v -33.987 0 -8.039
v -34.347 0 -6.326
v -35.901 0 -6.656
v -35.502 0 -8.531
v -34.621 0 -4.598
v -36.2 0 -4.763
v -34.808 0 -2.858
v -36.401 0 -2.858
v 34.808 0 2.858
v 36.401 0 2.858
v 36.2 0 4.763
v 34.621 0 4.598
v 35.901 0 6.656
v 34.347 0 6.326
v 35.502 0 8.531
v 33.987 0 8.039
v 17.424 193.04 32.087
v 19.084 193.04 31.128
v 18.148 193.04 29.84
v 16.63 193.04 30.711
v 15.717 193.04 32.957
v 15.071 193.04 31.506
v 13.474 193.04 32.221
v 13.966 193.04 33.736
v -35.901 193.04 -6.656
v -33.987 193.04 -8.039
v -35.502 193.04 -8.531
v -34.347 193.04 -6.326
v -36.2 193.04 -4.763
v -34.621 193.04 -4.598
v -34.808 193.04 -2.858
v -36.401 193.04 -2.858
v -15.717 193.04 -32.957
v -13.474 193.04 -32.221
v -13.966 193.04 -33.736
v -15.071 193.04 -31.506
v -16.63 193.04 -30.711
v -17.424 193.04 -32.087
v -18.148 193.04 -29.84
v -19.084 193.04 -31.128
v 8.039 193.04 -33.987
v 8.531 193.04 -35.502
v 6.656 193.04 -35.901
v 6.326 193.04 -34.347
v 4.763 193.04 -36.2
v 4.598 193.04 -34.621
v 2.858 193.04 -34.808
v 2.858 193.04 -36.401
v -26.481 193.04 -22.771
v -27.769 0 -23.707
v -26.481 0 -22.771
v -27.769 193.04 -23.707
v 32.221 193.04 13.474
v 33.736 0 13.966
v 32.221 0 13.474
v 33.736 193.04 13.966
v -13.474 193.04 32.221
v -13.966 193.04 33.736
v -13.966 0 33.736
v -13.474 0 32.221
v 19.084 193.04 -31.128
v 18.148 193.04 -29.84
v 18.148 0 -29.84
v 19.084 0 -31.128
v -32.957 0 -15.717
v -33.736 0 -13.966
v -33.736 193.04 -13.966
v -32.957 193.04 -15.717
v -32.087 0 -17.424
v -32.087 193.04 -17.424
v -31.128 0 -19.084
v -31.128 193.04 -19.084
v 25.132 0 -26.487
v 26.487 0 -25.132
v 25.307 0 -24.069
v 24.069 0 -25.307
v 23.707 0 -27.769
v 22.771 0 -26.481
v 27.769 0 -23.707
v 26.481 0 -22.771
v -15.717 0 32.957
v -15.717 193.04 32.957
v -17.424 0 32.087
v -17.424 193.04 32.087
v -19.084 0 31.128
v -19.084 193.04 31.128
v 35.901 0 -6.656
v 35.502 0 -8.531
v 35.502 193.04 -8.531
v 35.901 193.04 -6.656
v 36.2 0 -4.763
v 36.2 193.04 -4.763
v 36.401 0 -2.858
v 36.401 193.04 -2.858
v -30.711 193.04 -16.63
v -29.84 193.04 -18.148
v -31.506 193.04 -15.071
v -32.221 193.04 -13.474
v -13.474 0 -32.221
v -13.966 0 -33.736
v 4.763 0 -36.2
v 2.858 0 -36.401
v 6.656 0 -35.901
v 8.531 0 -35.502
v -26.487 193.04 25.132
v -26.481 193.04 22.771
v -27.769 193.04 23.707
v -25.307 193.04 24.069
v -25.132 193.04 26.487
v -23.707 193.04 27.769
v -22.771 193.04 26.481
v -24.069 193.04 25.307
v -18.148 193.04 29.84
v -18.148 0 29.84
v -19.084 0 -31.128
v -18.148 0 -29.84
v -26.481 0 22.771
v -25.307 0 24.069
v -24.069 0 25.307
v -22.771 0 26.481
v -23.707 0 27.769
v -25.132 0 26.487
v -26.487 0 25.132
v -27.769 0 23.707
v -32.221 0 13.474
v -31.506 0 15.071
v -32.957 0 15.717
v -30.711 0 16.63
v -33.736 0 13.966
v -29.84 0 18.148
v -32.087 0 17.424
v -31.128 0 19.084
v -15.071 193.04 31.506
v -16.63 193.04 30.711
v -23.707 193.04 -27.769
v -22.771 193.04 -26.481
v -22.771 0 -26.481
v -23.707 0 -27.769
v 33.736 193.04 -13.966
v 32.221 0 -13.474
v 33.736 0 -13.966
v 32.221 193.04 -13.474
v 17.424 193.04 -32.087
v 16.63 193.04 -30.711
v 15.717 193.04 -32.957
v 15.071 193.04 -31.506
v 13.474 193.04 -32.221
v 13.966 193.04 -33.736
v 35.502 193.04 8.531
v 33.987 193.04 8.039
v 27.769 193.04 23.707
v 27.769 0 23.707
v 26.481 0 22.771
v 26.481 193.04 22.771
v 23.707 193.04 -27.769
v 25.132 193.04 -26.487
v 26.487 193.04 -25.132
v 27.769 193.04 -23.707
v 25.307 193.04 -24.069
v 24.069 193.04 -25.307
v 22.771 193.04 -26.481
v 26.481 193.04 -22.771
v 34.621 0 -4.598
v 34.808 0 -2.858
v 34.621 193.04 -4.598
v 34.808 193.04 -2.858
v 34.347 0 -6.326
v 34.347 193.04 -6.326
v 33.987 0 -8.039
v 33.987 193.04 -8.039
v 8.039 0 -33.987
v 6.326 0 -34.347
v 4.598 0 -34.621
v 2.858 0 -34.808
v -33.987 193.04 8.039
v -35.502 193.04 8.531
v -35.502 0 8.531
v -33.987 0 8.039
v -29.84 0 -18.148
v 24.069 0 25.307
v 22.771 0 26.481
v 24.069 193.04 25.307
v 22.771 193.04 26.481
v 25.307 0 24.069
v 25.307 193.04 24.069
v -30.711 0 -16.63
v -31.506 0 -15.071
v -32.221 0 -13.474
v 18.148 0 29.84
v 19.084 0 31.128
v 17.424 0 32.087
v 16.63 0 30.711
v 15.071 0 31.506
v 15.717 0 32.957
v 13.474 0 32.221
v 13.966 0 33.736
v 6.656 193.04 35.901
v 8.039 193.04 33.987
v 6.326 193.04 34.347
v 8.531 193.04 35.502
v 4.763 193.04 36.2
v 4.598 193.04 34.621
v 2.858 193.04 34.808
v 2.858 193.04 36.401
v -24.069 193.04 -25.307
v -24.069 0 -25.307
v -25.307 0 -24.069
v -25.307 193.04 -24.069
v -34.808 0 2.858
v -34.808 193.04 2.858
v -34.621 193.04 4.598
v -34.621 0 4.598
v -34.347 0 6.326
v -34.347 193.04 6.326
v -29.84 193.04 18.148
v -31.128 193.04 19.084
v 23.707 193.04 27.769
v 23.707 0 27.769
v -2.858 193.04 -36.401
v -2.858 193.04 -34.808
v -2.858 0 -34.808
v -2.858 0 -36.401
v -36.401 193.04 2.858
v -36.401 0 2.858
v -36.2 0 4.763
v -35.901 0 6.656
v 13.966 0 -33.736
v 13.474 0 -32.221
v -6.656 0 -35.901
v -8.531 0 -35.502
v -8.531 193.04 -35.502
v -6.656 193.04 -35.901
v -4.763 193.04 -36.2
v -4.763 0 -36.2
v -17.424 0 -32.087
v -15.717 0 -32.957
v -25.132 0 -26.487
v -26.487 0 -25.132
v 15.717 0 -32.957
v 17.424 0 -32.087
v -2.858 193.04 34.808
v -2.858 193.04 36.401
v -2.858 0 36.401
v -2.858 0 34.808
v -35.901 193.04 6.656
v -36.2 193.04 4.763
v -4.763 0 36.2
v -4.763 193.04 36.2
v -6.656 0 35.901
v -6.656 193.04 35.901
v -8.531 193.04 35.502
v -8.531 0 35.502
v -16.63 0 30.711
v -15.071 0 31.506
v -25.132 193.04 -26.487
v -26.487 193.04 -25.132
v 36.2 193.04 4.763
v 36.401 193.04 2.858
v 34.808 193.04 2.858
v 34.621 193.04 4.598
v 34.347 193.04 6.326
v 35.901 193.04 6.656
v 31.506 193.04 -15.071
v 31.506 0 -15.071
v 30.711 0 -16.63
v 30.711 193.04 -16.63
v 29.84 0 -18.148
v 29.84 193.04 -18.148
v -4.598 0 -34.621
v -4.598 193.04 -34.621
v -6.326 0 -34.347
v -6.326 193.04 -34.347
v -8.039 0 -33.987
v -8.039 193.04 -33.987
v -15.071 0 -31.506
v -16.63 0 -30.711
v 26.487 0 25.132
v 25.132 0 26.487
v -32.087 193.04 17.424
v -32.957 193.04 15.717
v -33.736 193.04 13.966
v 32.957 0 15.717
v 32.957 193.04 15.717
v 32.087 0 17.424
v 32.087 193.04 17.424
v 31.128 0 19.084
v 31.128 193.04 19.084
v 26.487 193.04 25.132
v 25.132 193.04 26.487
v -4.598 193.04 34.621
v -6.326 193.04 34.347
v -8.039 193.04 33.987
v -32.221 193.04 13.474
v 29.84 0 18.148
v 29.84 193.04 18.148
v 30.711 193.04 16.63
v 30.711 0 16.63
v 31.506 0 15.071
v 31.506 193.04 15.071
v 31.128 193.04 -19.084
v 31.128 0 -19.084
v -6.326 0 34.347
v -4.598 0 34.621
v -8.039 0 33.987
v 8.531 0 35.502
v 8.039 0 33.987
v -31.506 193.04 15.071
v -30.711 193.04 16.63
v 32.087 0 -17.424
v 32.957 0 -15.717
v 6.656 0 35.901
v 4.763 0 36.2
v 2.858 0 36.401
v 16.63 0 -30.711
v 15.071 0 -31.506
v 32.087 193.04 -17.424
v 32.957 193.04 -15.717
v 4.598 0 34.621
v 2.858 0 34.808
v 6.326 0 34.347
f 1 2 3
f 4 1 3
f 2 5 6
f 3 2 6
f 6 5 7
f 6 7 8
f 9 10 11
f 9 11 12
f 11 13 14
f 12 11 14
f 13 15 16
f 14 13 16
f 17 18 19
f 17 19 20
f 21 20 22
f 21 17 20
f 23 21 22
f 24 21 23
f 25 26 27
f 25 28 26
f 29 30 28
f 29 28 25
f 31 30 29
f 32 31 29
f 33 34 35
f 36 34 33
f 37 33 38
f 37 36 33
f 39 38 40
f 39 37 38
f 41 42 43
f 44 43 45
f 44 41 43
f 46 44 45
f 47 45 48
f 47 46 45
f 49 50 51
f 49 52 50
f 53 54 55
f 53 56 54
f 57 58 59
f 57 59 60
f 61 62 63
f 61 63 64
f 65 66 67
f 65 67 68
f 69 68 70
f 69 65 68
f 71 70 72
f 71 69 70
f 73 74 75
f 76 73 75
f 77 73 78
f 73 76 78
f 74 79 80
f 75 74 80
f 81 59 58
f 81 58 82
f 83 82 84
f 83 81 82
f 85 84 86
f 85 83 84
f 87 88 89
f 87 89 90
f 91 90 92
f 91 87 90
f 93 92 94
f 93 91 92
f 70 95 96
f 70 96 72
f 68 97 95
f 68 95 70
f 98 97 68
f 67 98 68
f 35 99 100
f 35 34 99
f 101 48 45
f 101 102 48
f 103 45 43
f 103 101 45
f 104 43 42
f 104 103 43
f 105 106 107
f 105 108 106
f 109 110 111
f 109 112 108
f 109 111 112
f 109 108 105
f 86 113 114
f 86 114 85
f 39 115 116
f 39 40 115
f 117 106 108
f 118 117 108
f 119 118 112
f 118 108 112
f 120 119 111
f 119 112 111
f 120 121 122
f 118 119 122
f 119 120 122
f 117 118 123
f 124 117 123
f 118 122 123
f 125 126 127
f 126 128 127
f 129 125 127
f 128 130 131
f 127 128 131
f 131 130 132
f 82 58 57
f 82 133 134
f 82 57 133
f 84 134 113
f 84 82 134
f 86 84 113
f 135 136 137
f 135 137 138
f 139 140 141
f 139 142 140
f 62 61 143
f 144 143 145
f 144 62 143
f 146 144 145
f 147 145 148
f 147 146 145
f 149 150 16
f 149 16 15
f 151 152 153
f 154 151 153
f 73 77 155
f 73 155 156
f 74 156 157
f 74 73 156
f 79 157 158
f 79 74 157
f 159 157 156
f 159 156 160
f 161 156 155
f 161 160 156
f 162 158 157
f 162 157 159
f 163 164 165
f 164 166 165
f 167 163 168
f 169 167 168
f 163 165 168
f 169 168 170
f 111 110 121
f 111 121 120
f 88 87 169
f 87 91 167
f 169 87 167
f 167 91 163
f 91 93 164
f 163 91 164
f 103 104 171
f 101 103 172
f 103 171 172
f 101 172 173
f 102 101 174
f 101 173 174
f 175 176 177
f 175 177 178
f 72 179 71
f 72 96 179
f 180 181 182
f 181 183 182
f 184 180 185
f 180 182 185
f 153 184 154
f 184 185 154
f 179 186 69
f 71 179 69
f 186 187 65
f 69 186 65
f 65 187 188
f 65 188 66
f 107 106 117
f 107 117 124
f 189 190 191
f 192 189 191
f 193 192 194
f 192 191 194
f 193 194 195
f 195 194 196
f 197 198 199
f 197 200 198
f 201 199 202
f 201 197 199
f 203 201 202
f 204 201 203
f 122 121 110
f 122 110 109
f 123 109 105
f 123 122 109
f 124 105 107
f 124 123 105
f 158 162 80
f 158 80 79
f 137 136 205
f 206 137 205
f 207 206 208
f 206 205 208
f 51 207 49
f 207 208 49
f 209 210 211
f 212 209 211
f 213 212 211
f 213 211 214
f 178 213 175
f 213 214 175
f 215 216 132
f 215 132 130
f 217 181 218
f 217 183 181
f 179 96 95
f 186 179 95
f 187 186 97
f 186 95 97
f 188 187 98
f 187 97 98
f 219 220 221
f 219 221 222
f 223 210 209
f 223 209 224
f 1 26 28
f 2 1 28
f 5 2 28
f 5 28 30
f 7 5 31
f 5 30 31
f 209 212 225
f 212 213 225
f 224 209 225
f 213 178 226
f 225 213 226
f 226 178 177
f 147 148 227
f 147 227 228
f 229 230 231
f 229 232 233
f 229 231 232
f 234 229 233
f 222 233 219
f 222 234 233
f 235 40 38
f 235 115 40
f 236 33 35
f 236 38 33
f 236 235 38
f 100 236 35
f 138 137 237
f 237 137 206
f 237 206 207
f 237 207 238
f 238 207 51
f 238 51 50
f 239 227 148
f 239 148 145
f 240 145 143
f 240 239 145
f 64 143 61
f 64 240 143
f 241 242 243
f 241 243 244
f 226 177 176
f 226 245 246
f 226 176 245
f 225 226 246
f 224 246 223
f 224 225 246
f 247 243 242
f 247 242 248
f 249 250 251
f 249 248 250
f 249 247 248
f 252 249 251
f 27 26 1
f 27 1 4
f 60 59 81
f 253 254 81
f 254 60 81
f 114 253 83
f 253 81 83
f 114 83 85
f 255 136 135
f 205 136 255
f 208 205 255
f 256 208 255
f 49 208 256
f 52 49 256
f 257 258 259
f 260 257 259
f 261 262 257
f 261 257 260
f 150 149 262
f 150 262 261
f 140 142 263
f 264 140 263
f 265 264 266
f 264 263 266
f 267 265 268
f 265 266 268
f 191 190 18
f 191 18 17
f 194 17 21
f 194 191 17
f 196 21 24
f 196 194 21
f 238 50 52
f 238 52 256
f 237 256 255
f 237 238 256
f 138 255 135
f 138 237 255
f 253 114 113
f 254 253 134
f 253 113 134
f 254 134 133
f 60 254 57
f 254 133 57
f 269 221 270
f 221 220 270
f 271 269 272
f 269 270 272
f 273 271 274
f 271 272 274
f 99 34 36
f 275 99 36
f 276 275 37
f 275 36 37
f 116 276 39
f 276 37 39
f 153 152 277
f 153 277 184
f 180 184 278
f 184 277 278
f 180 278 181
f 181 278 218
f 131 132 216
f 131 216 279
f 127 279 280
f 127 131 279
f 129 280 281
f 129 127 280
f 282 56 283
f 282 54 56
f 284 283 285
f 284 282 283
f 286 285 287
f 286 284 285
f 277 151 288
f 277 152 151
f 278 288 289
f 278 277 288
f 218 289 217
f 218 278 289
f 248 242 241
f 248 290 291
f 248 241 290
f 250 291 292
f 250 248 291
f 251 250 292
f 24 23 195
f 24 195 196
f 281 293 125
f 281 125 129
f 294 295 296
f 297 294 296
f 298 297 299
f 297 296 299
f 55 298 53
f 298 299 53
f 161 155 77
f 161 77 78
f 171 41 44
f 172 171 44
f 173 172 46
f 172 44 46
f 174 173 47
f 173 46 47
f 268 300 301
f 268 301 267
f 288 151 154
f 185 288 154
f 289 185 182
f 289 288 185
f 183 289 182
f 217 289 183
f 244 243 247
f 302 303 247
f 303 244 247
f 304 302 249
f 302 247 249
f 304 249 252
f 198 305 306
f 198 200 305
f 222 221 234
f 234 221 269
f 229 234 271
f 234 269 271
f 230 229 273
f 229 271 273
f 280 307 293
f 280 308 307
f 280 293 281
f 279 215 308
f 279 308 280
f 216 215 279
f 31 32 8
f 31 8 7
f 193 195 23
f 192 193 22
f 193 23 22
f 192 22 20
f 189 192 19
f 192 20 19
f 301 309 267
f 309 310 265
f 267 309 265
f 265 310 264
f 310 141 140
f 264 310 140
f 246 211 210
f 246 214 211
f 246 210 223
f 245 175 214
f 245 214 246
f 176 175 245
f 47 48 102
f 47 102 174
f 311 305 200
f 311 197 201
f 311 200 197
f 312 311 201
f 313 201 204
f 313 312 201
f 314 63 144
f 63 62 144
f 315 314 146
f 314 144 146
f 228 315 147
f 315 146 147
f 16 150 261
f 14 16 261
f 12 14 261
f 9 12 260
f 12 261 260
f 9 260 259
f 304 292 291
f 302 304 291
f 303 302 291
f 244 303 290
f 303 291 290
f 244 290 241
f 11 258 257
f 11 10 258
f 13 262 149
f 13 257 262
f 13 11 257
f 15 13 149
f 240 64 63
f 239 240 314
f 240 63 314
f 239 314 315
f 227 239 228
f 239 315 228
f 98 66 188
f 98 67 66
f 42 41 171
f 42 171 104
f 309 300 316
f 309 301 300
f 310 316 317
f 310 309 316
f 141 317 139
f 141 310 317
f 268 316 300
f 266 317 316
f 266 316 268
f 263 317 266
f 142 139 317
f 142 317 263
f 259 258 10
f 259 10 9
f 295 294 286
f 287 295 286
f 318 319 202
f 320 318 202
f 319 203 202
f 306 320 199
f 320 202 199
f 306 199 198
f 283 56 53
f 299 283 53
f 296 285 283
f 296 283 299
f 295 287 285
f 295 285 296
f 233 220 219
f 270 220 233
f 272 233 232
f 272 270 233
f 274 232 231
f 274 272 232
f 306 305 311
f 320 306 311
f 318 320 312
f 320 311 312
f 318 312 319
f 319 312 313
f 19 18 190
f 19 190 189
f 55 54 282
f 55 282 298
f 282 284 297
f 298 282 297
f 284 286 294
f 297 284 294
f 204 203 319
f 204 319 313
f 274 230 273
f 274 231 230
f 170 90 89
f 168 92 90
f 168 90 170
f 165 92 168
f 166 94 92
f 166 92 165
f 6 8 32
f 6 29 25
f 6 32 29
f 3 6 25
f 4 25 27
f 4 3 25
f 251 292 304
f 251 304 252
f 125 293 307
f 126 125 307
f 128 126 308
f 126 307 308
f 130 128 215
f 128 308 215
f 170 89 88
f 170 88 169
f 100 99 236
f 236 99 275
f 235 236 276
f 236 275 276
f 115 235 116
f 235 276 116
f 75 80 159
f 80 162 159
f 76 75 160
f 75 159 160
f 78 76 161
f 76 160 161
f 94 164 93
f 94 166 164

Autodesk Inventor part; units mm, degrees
ref_plane "YZ Plane" through (0, 0, 0) normal (1, 0, 0) x (0, 1, 0)
ref_plane "XZ Plane" through (0, 0, 0) normal (0, 1, 0) x (-1, 0, 0)
ref_plane "XY Plane" through (0, 0, 0) normal (0, 0, 1) x (1, 0, 0)
sketch "Sketch1" plane through (0, 0, 0) normal (0, 1, 0) x (-1, 0, 0)
  circle A0 centre (0, 0) radius 36.5125
  dimension "d0" = 73.025
extrude "Extrusion1" add sketch "Sketch1" along normal blind 193.04
sketch "Sketch2" plane through (0, 193.04, 0) normal (0, 1, 0) x (1, 0, 0)
  circle A0 centre (0, 0) radius 34.925
  dimension "d3" = 69.85
extrude "Extrusion2" cut sketch "Sketch2" against normal through all
sketch "Sketch3" plane through (0, 193.04, 0) normal (0, 1, 0) x (1, 0, 0)
  line L0 (-31.75, -2.8575) -> (-37.465, -2.8575)
  line L1 (-37.465, -2.8575) -> (-37.465, 2.8575)
  line L2 (-37.465, 2.8575) -> (-31.75, 2.8575)
  line L3 (-31.75, 2.8575) -> (-31.75, -2.8575)
  circle A0 centre (0, 0) radius 36.5125 projected
  line L4 (-29.313, -12.5289) -> (-34.7483, -14.295)
  line L5 (-34.7483, -14.295) -> (-36.5143, -8.8597)
  line L6 (-36.5143, -8.8597) -> (-31.0791, -7.0936)
  line L7 (-31.0791, -7.0936) -> (-29.313, -12.5289)
  line L8 (-24.0067, -20.9739) -> (-28.6302, -24.3331)
  line L9 (-28.6302, -24.3331) -> (-31.9894, -19.7096)
  line L10 (-31.9894, -19.7096) -> (-27.3659, -16.3504)
  line L11 (-27.3659, -16.3504) -> (-24.0067, -20.9739)
  line L12 (-16.3504, -27.3659) -> (-19.7096, -31.9894)
  line L13 (-19.7096, -31.9894) -> (-24.3331, -28.6302)
  line L14 (-24.3331, -28.6302) -> (-20.9739, -24.0067)
  line L15 (-20.9739, -24.0067) -> (-16.3504, -27.3659)
  line L16 (-7.0936, -31.0791) -> (-8.8597, -36.5143)
  line L17 (-8.8597, -36.5143) -> (-14.295, -34.7483)
  line L18 (-14.295, -34.7483) -> (-12.5289, -29.313)
  line L19 (-12.5289, -29.313) -> (-7.0936, -31.0791)
  line L20 (2.8575, -31.75) -> (2.8575, -37.465)
  line L21 (2.8575, -37.465) -> (-2.8575, -37.465)
  line L22 (-2.8575, -37.465) -> (-2.8575, -31.75)
  line L23 (-2.8575, -31.75) -> (2.8575, -31.75)
  line L24 (12.5289, -29.313) -> (14.295, -34.7483)
  line L25 (14.295, -34.7483) -> (8.8597, -36.5143)
  line L26 (8.8597, -36.5143) -> (7.0936, -31.0791)
  line L27 (7.0936, -31.0791) -> (12.5289, -29.313)
  line L28 (20.9739, -24.0067) -> (24.3331, -28.6302)
  line L29 (24.3331, -28.6302) -> (19.7096, -31.9894)
  line L30 (19.7096, -31.9894) -> (16.3504, -27.3659)
  line L31 (16.3504, -27.3659) -> (20.9739, -24.0067)
  line L32 (27.3659, -16.3504) -> (31.9894, -19.7096)
  line L33 (31.9894, -19.7096) -> (28.6302, -24.3331)
  line L34 (28.6302, -24.3331) -> (24.0067, -20.9739)
  line L35 (24.0067, -20.9739) -> (27.3659, -16.3504)
  line L36 (31.0791, -7.0936) -> (36.5143, -8.8597)
  line L37 (36.5143, -8.8597) -> (34.7483, -14.295)
  line L38 (34.7483, -14.295) -> (29.313, -12.5289)
  line L39 (29.313, -12.5289) -> (31.0791, -7.0936)
  line L40 (31.75, 2.8575) -> (37.465, 2.8575)
  line L41 (37.465, 2.8575) -> (37.465, -2.8575)
  line L42 (37.465, -2.8575) -> (31.75, -2.8575)
  line L43 (31.75, -2.8575) -> (31.75, 2.8575)
  line L44 (29.313, 12.5289) -> (34.7483, 14.295)
  line L45 (34.7483, 14.295) -> (36.5143, 8.8597)
  line L46 (36.5143, 8.8597) -> (31.0791, 7.0936)
  line L47 (31.0791, 7.0936) -> (29.313, 12.5289)
  line L48 (24.0067, 20.9739) -> (28.6302, 24.3331)
  line L49 (28.6302, 24.3331) -> (31.9894, 19.7096)
  line L50 (31.9894, 19.7096) -> (27.3659, 16.3504)
  line L51 (27.3659, 16.3504) -> (24.0067, 20.9739)
  line L52 (16.3504, 27.3659) -> (19.7096, 31.9894)
  line L53 (19.7096, 31.9894) -> (24.3331, 28.6302)
  line L54 (24.3331, 28.6302) -> (20.9739, 24.0067)
  line L55 (20.9739, 24.0067) -> (16.3504, 27.3659)
  line L56 (7.0936, 31.0791) -> (8.8597, 36.5143)
  line L57 (8.8597, 36.5143) -> (14.295, 34.7483)
  line L58 (14.295, 34.7483) -> (12.5289, 29.313)
  line L59 (12.5289, 29.313) -> (7.0936, 31.0791)
  line L60 (-2.8575, 31.75) -> (-2.8575, 37.465)
  line L61 (-2.8575, 37.465) -> (2.8575, 37.465)
  line L62 (2.8575, 37.465) -> (2.8575, 31.75)
  line L63 (2.8575, 31.75) -> (-2.8575, 31.75)
  line L64 (-12.5289, 29.313) -> (-14.295, 34.7483)
  line L65 (-14.295, 34.7483) -> (-8.8597, 36.5143)
  line L66 (-8.8597, 36.5143) -> (-7.0936, 31.0791)
  line L67 (-7.0936, 31.0791) -> (-12.5289, 29.313)
  line L68 (-20.9739, 24.0067) -> (-24.3331, 28.6302)
  line L69 (-24.3331, 28.6302) -> (-19.7096, 31.9894)
  line L70 (-19.7096, 31.9894) -> (-16.3504, 27.3659)
  line L71 (-16.3504, 27.3659) -> (-20.9739, 24.0067)
  line L72 (-27.3659, 16.3504) -> (-31.9894, 19.7096)
  line L73 (-31.9894, 19.7096) -> (-28.6302, 24.3331)
  line L74 (-28.6302, 24.3331) -> (-24.0067, 20.9739)
  line L75 (-24.0067, 20.9739) -> (-27.3659, 16.3504)
  line L76 (-31.0791, 7.0936) -> (-36.5143, 8.8597)
  line L77 (-36.5143, 8.8597) -> (-34.7483, 14.295)
  line L78 (-34.7483, 14.295) -> (-29.313, 12.5289)
  line L79 (-29.313, 12.5289) -> (-31.0791, 7.0936)
  circle A1 centre (0, 0) radius 34.925 projected
  point P0 (-36.5125, 0)
  point P1 (-34.7255, -11.283)
  point P2 (-29.5392, -21.4615)
  point P3 (-21.4615, -29.5392)
  point P4 (-11.283, -34.7255)
  point P5 (0, -36.5125)
  point P6 (11.283, -34.7255)
  point P7 (21.4615, -29.5392)
  point P8 (29.5392, -21.4615)
  point P9 (34.7255, -11.283)
  point P10 (36.5125, 0)
  point P11 (34.7255, 11.283)
  point P12 (29.5392, 21.4615)
  point P13 (21.4615, 29.5392)
  point P14 (11.283, 34.7255)
  point P15 (0, 36.5125)
  point P16 (-11.283, 34.7255)
  point P17 (-21.4615, 29.5392)
  point P18 (-29.5392, 21.4615)
  point P19 (-34.7255, 11.283)
  dimension "d6" = 5.715
  dimension "d7" = 5.715
  dimension "d8" = 2.8575
  dimension "d13" = 360
  dimension "d15" = 2.54
extrude "Extrusion3" cut sketch "Sketch3" against normal through all contours L0 A1 L2 L3 | L0 A0 L2 A1 | L0 L1 L2 A0 | A1 L4 A0 L6 | L6 L7 L4 A1 | A0 L4 L5 L6 | A1 L78 L79 L76 | L76 A0 L78 A1 | L76 L77 L78 A0 | A1 L8 A0 L10 | L10 L11 L8 A1 | A0 L8 L9 L10 | A1 L74 L75 L72 | L72 A0 L74 A1 | L72 L73 L74 A0 | A1 L12 A0 L14 | L14 L15 L12 A1 | A0 L12 L13 L14 | A1 L70 L71 L68 | L68 A0 L70 A1 | L68 L69 L70 A0 | A1 L16 A0 L18 | L18 L19 L16 A1 | A0 L16 L17 L18 | A1 L66 L67 L64 | L64 A0 L66 A1 | L64 L65 L66 A0 | A1 L20 A0 L22 | L22 L23 L20 A1 | A0 L20 L21 L22 | A1 L62 L63 L60 | L60 A0 L62 A1 | L60 L61 L62 A0 | A1 L24 A0 L26 | L26 L27 L24 A1 | A0 L24 L25 L26 | A1 L58 L59 L56 | L56 A0 L58 A1 | L56 L57 L58 A0 | A1 L28 A0 L30 | L30 L31 L28 A1 | A0 L28 L29 L30 | A1 L54 L55 L52 | L52 A0 L54 A1 | L52 L53 L54 A0 | A1 L32 A0 L34 | L34 L35 L32 A1 | A0 L32 L33 L34 | A1 L50 L51 L48 | L48 A0 L50 A1 | L48 L49 L50 A0 | A1 L36 A0 L38 | L38 L39 L36 A1 | A0 L36 L37 L38 | A1 L46 L47 L44 | L44 A0 L46 A1 | L44 L45 L46 A0 | A1 L40 A0 L42 | L42 L43 L40 A1 | A0 L40 L41 L42
properties part number "bandsbottomroller"
